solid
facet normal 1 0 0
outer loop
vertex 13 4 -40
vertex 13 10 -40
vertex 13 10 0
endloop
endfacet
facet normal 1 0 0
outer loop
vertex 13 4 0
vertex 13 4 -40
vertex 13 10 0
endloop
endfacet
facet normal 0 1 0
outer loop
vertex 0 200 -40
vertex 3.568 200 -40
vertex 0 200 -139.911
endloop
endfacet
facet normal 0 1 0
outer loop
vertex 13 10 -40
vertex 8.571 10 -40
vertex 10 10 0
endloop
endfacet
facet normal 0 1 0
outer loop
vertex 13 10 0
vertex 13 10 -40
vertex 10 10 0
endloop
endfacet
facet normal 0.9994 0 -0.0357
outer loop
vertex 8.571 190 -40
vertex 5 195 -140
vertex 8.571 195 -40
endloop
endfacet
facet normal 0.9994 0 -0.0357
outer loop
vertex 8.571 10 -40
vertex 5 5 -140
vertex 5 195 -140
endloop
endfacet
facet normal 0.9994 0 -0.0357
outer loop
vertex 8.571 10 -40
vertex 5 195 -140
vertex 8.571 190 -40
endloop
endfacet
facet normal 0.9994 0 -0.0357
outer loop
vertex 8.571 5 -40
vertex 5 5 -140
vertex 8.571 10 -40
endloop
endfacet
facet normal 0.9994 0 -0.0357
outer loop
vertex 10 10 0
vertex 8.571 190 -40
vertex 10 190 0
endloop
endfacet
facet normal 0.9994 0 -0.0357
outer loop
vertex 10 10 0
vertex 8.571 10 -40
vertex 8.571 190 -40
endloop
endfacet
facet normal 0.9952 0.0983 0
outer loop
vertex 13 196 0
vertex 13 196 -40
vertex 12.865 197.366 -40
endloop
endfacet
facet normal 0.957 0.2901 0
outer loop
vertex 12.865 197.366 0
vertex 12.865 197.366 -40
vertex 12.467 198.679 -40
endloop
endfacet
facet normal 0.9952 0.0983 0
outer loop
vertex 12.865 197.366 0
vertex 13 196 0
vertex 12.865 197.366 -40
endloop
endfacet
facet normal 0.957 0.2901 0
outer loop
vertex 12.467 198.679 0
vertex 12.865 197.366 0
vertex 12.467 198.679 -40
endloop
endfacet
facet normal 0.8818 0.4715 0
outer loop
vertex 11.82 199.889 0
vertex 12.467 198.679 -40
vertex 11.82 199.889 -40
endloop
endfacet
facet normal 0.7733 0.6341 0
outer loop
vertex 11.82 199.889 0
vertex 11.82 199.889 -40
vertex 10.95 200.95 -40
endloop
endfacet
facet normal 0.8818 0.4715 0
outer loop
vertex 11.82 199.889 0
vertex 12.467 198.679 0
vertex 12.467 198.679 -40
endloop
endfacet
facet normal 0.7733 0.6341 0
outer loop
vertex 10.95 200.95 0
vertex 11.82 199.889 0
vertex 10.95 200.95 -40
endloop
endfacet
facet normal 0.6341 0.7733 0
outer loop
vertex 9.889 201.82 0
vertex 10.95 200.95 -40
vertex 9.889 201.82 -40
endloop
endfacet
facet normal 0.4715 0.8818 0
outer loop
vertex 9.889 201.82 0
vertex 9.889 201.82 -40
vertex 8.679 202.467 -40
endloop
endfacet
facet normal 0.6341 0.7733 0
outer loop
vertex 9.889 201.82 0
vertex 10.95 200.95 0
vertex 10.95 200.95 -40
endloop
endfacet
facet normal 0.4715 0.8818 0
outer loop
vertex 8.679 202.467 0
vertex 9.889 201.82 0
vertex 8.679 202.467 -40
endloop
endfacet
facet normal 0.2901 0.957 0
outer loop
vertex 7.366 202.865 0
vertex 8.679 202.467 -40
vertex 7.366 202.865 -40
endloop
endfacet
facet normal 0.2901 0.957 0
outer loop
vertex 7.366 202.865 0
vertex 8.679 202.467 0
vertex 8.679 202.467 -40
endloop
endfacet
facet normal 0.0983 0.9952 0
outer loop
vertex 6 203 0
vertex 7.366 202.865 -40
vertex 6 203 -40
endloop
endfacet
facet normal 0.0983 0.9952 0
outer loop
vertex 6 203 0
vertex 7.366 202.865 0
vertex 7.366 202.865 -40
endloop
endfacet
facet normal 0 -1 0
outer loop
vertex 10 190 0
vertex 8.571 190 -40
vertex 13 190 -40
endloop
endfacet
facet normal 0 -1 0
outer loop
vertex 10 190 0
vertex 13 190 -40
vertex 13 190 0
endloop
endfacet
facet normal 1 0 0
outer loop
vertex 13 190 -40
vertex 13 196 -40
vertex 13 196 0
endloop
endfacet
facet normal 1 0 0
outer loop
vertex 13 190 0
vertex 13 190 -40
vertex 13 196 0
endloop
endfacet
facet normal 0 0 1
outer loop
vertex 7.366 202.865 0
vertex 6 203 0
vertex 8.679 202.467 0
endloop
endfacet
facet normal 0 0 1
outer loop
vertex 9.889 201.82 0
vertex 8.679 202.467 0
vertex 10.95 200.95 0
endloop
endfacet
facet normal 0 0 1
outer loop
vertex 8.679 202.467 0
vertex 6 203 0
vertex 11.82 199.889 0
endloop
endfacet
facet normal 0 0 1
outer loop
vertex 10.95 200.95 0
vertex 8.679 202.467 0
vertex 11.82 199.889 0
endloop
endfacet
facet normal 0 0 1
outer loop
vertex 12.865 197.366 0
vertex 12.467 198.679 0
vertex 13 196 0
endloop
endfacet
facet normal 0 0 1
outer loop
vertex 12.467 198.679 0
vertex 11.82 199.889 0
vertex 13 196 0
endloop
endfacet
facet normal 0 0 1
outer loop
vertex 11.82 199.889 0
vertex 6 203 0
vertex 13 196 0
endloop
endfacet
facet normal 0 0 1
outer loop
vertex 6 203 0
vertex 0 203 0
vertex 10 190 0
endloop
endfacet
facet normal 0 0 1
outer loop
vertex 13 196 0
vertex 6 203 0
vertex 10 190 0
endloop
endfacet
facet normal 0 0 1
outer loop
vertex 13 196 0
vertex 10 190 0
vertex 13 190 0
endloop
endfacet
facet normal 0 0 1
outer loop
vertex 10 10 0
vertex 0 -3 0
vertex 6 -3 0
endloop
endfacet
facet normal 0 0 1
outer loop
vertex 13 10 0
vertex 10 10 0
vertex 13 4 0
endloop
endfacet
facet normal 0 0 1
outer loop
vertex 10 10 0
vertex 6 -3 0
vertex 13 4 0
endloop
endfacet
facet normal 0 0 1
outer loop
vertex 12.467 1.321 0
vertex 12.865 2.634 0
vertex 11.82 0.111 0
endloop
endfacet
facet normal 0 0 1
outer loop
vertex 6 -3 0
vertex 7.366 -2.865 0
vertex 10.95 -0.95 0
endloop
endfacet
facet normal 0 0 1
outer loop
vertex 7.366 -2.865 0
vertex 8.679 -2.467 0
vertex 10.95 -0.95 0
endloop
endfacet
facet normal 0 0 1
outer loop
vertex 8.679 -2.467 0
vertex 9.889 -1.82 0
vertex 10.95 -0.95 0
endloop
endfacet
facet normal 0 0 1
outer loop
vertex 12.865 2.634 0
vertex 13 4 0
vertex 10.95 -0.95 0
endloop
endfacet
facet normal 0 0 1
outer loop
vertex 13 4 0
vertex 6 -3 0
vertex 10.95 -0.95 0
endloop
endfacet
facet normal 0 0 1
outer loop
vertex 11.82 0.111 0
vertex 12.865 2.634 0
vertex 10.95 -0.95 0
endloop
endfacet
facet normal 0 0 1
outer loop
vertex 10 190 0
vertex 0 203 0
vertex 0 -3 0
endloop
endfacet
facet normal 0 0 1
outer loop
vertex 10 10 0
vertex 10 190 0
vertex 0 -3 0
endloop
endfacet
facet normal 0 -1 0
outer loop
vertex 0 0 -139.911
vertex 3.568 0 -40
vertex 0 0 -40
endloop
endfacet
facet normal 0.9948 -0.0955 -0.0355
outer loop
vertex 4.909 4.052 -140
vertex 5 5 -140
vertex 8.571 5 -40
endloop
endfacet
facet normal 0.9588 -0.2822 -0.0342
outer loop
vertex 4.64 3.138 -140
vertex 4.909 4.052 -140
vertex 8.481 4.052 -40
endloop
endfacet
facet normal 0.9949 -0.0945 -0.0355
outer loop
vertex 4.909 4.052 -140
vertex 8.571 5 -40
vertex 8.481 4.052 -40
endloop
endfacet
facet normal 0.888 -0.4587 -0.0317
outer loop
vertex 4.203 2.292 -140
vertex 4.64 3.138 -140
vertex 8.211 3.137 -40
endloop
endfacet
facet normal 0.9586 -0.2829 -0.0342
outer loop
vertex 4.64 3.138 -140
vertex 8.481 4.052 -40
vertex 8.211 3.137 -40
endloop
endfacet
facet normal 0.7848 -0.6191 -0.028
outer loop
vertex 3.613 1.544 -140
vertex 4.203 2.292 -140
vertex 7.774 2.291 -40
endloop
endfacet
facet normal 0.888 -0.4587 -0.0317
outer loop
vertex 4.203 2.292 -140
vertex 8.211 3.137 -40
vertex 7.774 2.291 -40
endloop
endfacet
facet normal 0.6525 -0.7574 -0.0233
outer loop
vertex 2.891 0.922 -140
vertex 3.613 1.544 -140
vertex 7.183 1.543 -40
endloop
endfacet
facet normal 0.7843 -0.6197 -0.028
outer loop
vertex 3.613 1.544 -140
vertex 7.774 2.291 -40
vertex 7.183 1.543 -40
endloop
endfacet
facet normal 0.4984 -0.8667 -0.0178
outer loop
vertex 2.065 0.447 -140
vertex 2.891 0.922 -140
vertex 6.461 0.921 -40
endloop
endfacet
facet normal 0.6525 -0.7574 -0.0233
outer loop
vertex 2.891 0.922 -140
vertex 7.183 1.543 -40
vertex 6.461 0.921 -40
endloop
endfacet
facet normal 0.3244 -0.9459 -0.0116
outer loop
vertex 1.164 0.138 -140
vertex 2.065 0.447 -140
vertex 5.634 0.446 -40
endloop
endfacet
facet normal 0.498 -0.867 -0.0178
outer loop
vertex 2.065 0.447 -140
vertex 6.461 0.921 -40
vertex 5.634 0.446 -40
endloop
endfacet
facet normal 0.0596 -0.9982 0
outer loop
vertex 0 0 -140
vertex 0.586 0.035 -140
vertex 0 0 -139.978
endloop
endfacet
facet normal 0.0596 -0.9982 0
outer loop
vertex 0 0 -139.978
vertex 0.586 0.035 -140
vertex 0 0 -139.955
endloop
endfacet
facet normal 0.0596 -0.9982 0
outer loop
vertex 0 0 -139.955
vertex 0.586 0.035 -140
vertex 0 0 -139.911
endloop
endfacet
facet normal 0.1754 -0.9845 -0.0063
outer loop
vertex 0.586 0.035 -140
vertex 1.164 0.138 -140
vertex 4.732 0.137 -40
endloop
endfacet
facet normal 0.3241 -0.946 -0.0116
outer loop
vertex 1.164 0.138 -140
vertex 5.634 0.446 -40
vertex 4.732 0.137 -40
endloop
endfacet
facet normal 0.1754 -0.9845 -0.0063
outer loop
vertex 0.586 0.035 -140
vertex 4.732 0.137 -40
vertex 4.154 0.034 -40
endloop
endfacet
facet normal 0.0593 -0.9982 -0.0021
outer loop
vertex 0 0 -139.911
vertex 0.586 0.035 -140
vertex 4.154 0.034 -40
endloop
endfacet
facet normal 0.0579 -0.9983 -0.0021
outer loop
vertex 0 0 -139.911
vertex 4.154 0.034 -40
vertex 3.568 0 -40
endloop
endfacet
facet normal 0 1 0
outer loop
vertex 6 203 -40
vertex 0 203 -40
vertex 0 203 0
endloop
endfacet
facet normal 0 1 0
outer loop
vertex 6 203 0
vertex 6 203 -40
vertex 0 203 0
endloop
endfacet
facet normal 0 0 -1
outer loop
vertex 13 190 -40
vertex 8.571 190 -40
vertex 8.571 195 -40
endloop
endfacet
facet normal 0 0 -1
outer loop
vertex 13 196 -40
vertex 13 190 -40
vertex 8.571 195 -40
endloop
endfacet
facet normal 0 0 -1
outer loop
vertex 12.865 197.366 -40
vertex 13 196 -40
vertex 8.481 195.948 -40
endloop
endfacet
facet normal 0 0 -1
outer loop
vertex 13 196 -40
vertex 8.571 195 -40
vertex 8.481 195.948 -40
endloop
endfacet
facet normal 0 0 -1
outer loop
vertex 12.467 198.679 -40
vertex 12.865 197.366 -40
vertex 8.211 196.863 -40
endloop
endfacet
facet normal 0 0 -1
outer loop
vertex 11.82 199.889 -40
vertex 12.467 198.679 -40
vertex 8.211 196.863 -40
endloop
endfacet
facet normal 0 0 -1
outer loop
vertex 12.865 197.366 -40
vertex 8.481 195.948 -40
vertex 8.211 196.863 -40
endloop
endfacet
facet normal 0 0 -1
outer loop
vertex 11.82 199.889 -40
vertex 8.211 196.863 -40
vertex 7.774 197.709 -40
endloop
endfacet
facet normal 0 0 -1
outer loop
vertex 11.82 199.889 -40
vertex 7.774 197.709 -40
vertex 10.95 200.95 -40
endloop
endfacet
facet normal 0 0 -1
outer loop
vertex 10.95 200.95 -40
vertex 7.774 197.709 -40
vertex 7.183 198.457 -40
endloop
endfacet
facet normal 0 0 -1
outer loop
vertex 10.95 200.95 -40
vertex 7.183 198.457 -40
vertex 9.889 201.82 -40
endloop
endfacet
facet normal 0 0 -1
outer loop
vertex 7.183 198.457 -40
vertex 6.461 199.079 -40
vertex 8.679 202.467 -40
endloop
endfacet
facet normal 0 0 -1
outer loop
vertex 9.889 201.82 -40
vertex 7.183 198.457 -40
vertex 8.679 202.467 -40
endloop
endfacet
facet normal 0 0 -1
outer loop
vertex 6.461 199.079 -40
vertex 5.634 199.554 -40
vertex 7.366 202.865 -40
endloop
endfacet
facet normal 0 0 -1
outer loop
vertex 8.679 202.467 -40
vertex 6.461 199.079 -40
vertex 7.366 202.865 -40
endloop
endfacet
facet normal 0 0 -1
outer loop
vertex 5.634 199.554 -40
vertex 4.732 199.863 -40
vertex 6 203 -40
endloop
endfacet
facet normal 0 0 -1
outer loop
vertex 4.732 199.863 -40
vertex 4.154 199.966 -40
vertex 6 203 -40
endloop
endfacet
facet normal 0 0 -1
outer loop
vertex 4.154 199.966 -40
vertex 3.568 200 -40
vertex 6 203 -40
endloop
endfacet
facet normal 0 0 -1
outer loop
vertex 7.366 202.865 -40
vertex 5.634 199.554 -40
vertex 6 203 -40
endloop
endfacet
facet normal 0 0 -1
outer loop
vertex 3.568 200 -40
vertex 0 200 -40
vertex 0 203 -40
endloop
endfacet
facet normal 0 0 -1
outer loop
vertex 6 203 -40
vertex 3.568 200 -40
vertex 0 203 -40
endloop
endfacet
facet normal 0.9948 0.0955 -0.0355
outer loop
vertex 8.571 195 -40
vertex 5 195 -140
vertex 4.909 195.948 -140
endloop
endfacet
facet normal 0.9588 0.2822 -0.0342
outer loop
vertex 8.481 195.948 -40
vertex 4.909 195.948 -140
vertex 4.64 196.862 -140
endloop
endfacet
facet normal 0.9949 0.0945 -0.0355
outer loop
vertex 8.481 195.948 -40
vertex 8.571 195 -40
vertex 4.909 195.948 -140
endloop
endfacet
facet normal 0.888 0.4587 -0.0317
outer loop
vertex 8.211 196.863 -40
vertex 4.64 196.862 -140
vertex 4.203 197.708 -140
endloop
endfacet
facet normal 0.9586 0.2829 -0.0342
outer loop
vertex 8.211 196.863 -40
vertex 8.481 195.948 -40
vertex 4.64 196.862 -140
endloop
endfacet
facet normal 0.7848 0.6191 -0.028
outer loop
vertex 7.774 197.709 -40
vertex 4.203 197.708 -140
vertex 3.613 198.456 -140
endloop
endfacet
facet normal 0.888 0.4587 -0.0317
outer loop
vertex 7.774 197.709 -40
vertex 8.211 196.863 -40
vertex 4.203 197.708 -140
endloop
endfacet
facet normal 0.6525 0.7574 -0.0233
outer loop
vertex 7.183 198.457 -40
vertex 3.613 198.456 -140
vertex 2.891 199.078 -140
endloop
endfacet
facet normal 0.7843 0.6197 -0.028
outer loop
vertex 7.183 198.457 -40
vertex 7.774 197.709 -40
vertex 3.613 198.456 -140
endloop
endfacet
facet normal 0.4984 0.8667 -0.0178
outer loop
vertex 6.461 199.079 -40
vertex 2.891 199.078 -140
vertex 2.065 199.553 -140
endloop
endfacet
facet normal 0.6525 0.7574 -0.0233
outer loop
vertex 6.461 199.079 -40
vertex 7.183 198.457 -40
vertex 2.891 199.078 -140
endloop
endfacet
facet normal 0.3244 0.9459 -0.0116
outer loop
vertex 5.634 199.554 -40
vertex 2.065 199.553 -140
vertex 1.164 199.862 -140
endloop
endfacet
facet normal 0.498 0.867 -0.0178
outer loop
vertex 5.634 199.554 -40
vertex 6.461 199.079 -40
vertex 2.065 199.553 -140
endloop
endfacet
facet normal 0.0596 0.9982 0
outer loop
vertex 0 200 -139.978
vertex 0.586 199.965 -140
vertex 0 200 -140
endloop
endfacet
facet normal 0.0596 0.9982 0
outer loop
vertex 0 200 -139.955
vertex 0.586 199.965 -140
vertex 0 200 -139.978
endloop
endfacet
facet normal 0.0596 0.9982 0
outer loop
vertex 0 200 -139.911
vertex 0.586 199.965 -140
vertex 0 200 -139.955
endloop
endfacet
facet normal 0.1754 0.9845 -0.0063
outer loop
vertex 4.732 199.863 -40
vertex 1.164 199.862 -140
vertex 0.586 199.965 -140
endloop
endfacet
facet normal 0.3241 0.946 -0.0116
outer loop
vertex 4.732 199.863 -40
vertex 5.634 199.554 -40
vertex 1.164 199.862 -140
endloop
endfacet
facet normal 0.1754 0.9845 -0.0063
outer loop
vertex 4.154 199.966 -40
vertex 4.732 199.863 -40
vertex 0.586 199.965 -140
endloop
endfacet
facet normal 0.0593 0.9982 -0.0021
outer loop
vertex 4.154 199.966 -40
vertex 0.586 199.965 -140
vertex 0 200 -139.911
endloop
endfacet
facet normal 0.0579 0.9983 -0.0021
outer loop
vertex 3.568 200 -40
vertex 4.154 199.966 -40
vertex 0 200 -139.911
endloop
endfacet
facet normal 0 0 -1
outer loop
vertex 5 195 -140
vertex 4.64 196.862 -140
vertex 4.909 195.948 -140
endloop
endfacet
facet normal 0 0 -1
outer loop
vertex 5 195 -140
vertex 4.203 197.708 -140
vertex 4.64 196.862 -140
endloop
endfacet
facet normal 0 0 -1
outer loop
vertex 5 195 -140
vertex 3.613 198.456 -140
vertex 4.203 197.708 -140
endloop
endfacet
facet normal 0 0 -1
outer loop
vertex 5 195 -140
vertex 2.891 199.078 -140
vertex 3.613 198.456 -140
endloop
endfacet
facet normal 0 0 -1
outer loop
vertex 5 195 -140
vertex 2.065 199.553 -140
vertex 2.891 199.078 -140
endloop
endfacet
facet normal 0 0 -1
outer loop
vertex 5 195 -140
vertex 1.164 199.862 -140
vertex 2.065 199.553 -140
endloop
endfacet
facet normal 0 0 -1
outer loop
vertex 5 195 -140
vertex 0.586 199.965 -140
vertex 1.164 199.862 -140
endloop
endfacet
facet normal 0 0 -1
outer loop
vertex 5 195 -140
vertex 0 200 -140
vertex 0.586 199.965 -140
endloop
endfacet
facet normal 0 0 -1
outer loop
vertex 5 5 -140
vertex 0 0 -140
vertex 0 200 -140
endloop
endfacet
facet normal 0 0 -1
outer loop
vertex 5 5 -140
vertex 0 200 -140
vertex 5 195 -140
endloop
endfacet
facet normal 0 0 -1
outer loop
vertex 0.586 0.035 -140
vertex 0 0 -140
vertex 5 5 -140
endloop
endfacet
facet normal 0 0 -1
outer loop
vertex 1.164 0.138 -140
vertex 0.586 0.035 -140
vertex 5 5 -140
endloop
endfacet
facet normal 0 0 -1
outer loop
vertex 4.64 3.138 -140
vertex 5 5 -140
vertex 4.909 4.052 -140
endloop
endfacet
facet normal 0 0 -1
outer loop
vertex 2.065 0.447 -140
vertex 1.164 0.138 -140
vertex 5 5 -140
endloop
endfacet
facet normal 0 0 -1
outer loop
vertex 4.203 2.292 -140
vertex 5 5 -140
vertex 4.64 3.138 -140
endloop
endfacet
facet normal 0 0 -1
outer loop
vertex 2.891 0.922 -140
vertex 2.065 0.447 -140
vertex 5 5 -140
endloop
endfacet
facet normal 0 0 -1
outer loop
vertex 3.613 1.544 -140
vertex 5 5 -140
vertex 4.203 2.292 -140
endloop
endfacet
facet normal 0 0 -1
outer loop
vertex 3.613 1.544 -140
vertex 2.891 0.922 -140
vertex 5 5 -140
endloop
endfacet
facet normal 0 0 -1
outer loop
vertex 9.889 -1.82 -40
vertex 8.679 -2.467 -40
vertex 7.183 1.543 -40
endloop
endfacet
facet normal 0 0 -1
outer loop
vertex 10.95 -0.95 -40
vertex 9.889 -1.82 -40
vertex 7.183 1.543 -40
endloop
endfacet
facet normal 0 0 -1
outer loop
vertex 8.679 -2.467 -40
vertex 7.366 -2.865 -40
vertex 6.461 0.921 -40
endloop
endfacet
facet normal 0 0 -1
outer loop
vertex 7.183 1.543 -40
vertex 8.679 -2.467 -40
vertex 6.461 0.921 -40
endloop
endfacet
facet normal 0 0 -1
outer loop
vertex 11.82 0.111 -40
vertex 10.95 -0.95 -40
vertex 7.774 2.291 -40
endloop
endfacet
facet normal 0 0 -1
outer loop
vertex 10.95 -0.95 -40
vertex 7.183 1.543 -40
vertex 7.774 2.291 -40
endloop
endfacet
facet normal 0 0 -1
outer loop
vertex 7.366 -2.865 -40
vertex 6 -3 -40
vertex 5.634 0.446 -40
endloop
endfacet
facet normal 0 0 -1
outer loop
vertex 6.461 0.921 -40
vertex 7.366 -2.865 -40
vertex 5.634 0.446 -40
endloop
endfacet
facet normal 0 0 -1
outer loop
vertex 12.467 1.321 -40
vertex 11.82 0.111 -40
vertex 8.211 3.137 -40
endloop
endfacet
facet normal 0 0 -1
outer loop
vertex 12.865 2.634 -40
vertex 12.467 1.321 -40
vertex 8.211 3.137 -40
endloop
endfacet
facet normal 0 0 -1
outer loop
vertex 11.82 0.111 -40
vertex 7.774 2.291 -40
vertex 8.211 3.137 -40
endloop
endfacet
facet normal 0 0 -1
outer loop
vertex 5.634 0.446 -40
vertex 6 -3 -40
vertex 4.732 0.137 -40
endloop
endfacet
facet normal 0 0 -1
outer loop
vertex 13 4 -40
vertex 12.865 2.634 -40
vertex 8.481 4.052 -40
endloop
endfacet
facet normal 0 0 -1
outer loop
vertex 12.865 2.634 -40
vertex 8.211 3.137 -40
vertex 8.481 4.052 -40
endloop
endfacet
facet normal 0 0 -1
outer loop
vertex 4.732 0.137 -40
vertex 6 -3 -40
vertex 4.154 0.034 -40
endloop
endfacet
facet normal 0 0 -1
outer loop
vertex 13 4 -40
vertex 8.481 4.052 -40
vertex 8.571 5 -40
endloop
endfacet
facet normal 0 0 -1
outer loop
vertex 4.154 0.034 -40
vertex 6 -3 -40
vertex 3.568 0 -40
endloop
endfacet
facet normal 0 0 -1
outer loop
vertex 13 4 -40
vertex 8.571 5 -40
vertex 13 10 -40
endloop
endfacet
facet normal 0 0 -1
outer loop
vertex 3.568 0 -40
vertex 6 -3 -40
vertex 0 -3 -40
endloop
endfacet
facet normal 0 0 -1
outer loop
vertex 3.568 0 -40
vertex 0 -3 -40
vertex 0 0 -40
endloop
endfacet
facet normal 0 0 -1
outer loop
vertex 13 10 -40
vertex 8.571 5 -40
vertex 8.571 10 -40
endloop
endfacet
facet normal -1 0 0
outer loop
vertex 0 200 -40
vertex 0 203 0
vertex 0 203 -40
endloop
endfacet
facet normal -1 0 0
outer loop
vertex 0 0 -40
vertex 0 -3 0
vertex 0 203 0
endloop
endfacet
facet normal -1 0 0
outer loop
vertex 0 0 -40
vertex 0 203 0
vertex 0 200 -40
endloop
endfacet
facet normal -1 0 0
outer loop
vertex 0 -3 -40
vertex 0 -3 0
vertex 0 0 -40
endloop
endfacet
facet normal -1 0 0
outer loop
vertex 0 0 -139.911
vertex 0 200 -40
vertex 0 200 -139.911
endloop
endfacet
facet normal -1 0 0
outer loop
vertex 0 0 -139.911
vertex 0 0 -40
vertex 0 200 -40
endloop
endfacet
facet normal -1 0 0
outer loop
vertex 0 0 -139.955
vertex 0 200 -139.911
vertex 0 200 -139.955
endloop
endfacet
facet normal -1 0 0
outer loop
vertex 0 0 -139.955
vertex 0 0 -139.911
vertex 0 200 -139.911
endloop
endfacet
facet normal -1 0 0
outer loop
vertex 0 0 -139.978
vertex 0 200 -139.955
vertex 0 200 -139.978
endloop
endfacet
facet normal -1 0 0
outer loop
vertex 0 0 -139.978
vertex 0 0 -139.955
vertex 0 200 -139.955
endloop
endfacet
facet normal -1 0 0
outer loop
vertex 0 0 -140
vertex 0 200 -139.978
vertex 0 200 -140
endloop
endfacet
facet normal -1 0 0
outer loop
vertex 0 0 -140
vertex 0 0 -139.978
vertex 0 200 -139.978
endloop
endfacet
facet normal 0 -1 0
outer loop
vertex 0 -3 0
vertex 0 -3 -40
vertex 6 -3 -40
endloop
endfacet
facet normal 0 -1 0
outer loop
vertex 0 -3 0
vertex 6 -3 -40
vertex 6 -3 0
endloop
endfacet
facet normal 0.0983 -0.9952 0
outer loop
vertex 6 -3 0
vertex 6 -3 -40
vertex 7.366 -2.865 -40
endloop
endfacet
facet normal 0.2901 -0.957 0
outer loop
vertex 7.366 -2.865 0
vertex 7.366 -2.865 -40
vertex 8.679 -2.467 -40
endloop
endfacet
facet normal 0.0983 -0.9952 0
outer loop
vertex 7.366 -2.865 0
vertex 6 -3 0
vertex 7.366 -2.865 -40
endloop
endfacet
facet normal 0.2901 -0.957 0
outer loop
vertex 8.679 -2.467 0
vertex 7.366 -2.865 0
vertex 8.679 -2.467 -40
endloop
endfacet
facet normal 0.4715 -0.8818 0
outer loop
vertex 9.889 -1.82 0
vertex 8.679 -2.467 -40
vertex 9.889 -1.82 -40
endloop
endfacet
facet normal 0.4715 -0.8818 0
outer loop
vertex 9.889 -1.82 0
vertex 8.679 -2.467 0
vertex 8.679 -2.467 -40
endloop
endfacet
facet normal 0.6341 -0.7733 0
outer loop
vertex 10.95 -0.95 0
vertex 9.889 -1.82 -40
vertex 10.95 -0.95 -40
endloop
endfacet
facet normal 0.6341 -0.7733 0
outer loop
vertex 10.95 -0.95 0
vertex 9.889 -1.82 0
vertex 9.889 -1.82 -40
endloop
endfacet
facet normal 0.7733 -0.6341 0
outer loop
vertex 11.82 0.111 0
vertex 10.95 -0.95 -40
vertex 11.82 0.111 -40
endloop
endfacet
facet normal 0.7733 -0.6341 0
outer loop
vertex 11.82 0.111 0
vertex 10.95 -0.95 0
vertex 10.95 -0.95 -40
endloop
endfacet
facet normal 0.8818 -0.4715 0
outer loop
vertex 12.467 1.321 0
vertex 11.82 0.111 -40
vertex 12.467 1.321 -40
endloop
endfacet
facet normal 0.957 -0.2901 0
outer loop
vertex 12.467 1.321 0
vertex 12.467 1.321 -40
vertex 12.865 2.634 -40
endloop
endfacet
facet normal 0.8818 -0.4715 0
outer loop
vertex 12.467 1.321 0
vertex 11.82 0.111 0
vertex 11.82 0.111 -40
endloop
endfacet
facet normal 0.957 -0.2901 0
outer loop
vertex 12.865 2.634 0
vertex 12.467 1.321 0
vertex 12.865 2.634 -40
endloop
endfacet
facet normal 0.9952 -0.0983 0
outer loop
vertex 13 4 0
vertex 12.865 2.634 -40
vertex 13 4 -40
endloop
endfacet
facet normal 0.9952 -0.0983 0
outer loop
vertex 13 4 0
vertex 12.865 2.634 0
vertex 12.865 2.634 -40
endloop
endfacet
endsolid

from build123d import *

# Parameters (mm, degrees)
SALIENTE_EXTRUIR1_DEPTH = 200
CROQUIS5_W              = 40
CROQUIS5_H              = 13
SALIENTE_EXTRUIR4_DEPTH = 13
REDONDEO9_R             = 7
REDONDEO11_R            = 5


with BuildPart() as part:
    # Croquis1 → Saliente-Extruir1 (new body)
    with BuildSketch(Plane(origin=(0, 0, 0), x_dir=(1, 0, 0), z_dir=(0, 1, 0))):
        Polygon((5, 140), (10, 0), (5, 0), (0, 0), (0, 140), align=None)
    extrude(amount=SALIENTE_EXTRUIR1_DEPTH)

    # Croquis5 → Saliente-Extruir4 (add)
    with BuildSketch(Plane.ZY):
        with Locations((-20, 196.5)):
            Rectangle(CROQUIS5_W, CROQUIS5_H)
        with Locations((-20, 3.5)):
            Rectangle(CROQUIS5_W, CROQUIS5_H)
    extrude(amount=-SALIENTE_EXTRUIR4_DEPTH)

    # Redondeo9
    redondeo9_edges = [part.edges().sort_by_distance(p)[0] for p in [
        (13, 203, -20),
        (13, -3, -20),
    ]]
    fillet(redondeo9_edges, radius=REDONDEO9_R)

    # Redondeo11
    redondeo11_edges = [part.edges().sort_by_distance(p)[0] for p in [
        (6.785714286, 0, -90),
        (6.785714286, 200, -90),
    ]]
    fillet(redondeo11_edges, radius=REDONDEO11_R)


solid = part.part
